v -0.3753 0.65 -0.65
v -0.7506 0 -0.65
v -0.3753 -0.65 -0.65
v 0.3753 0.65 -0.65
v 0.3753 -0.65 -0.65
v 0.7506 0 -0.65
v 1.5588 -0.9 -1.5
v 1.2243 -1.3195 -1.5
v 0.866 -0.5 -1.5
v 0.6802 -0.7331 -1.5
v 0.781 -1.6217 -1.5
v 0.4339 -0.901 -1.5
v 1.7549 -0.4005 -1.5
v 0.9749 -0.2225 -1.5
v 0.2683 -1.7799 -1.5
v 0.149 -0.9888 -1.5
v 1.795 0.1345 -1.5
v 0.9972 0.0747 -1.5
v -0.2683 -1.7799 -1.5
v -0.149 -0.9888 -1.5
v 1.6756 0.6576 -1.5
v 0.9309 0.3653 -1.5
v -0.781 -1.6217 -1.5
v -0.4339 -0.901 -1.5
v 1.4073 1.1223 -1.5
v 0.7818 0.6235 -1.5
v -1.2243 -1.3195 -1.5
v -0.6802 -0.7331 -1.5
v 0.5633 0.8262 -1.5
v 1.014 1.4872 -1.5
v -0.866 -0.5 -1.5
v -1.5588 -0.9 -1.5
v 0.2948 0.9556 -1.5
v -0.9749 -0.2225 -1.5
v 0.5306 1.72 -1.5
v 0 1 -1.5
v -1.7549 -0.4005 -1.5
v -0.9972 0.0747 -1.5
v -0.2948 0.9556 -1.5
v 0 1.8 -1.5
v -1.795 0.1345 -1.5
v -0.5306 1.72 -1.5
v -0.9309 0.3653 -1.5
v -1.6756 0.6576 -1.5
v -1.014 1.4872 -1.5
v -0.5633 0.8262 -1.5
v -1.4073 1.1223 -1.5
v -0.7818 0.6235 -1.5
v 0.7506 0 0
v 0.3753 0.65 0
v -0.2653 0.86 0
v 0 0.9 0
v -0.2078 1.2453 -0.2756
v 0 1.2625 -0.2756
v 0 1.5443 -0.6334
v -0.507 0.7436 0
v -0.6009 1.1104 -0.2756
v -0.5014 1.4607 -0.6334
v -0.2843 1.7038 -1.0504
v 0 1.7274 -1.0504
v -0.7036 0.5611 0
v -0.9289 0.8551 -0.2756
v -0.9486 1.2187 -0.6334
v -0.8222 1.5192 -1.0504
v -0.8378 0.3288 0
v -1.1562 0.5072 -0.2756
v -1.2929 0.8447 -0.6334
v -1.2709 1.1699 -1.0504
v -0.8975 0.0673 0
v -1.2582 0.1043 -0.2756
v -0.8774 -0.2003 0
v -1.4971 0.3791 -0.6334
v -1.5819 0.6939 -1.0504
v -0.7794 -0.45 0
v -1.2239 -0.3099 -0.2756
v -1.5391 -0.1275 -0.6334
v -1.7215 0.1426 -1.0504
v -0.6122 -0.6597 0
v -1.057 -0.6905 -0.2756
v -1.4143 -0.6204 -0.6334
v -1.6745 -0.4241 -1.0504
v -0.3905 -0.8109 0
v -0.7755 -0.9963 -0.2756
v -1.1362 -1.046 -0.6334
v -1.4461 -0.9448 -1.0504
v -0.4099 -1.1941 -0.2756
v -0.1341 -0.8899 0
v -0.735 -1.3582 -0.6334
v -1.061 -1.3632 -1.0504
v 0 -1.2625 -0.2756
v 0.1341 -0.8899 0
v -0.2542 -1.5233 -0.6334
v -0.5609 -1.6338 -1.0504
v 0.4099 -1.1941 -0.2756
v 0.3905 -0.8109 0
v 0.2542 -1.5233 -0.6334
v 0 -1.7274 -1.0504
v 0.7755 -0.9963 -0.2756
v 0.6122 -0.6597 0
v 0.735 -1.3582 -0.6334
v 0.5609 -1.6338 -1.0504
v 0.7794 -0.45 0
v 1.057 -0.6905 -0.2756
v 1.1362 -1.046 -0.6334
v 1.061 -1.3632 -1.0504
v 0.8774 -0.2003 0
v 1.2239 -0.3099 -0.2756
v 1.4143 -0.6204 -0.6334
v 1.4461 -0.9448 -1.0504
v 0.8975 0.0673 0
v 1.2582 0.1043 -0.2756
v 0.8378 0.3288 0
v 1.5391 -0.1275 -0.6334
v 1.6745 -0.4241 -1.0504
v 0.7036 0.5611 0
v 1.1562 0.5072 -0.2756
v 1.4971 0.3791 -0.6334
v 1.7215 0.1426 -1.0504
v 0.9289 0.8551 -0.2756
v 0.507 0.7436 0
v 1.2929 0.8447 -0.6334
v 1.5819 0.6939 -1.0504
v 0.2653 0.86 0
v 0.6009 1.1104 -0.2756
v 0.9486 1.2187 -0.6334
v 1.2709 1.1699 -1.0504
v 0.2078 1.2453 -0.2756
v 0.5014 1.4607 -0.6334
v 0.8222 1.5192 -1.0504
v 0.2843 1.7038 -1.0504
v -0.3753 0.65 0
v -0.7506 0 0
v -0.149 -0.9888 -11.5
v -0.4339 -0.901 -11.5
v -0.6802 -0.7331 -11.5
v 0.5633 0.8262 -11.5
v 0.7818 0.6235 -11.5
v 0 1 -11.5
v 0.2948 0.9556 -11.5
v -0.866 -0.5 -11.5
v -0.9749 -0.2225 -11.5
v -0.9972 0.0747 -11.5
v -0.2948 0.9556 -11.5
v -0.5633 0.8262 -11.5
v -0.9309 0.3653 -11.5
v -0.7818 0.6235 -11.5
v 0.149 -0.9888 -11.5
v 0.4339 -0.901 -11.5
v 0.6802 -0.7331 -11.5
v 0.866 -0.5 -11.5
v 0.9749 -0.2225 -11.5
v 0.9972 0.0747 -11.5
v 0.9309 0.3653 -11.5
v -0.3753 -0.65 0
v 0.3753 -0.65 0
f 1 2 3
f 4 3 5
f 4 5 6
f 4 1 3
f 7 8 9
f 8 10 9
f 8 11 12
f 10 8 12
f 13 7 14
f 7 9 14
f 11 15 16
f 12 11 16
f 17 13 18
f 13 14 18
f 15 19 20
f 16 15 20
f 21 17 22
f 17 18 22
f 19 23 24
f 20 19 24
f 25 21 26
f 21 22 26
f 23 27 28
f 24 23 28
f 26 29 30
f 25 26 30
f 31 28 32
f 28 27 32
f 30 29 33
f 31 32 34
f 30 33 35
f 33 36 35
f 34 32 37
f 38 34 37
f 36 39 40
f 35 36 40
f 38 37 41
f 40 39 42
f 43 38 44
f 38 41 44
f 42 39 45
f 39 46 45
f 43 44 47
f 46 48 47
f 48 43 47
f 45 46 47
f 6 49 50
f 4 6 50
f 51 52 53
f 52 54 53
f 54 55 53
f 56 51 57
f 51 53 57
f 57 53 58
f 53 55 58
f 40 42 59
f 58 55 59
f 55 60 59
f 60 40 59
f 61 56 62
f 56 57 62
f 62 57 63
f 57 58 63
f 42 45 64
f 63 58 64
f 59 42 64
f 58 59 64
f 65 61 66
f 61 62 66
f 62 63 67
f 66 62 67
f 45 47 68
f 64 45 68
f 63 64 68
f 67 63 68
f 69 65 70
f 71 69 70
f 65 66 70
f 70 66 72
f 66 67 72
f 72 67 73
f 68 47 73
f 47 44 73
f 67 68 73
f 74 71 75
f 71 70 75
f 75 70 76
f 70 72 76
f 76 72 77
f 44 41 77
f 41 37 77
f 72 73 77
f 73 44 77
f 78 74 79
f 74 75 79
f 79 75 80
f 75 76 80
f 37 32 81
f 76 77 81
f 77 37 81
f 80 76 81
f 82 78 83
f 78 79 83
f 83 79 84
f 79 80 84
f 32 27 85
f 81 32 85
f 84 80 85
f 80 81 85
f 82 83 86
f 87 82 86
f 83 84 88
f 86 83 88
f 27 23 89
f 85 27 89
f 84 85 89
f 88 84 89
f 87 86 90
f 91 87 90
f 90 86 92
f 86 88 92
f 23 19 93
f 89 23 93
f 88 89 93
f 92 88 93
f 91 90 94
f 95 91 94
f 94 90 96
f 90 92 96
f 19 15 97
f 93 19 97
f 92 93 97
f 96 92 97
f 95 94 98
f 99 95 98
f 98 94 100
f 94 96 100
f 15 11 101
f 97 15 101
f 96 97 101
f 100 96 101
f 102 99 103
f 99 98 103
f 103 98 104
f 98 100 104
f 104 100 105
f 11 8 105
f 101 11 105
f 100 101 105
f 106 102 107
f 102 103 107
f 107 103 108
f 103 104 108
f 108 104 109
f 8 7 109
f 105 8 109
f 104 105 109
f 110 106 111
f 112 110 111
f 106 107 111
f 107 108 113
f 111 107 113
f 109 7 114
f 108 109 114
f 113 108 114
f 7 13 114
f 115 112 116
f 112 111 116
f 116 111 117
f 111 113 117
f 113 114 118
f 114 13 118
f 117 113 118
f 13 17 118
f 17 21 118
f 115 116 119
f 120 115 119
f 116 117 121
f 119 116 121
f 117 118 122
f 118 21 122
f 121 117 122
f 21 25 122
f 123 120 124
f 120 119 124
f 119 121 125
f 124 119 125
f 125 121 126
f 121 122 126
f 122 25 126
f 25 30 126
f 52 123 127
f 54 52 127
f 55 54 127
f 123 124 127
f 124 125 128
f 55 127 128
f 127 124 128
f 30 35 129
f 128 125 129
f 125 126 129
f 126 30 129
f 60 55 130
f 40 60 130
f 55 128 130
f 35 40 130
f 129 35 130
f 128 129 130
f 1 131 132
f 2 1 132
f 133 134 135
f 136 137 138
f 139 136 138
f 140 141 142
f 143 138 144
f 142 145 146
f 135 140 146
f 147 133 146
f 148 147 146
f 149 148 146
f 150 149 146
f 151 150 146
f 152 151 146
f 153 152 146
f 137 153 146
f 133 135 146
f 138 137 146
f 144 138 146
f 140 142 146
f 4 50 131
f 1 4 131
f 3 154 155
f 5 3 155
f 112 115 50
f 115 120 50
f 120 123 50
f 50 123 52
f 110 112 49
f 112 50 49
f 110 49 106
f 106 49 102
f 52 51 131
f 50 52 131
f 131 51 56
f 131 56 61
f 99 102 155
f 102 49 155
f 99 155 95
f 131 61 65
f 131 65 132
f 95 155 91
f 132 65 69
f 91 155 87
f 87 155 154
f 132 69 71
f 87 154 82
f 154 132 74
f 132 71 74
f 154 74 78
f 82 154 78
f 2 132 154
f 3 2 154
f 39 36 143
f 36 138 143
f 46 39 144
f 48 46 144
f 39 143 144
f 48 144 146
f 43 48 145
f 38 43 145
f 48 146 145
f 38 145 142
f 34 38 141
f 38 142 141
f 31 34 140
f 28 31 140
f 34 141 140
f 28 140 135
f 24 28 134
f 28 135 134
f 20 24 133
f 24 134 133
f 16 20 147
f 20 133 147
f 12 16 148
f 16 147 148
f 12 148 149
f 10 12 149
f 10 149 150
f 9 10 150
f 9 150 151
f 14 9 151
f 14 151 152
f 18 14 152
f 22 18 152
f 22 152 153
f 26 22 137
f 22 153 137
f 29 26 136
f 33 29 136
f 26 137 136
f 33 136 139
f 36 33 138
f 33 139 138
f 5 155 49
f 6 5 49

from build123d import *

# Parameters (mm, degrees)
CUT_EXTRUDE_1_DEPTH = 0.65


with BuildPart() as part:
    # 草图1 → 旋转1 (revolve)
    with BuildSketch(Plane(origin=(0, 0, 0), x_dir=(0, 0, -1), z_dir=(1, 0, 0))):
        with BuildLine():
            Line((0, 0), (0, 0.9))
            ThreePointArc((0, 0.9), (0.633393287, 1.544344521), (1.5, 1.8))
            Line((1.5, 1.8), (1.5, 1))
            Line((1.5, 1), (11.5, 1))
            Line((11.5, 1), (11.5, 0))
            Line((11.5, 0), (0, 0))
        make_face()
    revolve(axis=Axis((0, 0, 0), (0, 0, 1)))

    # 草图2 → 切除-拉伸1 (cut)
    with BuildSketch(Plane.XY):
        Polygon((0.75055535, 0), (0.375277675, 0.65), (-0.375277675, 0.65), (-0.75055535, 0), (-0.375277675, -0.65), (0.375277675, -0.65), align=None)
    extrude(amount=-CUT_EXTRUDE_1_DEPTH, mode=Mode.SUBTRACT)


solid = part.part
